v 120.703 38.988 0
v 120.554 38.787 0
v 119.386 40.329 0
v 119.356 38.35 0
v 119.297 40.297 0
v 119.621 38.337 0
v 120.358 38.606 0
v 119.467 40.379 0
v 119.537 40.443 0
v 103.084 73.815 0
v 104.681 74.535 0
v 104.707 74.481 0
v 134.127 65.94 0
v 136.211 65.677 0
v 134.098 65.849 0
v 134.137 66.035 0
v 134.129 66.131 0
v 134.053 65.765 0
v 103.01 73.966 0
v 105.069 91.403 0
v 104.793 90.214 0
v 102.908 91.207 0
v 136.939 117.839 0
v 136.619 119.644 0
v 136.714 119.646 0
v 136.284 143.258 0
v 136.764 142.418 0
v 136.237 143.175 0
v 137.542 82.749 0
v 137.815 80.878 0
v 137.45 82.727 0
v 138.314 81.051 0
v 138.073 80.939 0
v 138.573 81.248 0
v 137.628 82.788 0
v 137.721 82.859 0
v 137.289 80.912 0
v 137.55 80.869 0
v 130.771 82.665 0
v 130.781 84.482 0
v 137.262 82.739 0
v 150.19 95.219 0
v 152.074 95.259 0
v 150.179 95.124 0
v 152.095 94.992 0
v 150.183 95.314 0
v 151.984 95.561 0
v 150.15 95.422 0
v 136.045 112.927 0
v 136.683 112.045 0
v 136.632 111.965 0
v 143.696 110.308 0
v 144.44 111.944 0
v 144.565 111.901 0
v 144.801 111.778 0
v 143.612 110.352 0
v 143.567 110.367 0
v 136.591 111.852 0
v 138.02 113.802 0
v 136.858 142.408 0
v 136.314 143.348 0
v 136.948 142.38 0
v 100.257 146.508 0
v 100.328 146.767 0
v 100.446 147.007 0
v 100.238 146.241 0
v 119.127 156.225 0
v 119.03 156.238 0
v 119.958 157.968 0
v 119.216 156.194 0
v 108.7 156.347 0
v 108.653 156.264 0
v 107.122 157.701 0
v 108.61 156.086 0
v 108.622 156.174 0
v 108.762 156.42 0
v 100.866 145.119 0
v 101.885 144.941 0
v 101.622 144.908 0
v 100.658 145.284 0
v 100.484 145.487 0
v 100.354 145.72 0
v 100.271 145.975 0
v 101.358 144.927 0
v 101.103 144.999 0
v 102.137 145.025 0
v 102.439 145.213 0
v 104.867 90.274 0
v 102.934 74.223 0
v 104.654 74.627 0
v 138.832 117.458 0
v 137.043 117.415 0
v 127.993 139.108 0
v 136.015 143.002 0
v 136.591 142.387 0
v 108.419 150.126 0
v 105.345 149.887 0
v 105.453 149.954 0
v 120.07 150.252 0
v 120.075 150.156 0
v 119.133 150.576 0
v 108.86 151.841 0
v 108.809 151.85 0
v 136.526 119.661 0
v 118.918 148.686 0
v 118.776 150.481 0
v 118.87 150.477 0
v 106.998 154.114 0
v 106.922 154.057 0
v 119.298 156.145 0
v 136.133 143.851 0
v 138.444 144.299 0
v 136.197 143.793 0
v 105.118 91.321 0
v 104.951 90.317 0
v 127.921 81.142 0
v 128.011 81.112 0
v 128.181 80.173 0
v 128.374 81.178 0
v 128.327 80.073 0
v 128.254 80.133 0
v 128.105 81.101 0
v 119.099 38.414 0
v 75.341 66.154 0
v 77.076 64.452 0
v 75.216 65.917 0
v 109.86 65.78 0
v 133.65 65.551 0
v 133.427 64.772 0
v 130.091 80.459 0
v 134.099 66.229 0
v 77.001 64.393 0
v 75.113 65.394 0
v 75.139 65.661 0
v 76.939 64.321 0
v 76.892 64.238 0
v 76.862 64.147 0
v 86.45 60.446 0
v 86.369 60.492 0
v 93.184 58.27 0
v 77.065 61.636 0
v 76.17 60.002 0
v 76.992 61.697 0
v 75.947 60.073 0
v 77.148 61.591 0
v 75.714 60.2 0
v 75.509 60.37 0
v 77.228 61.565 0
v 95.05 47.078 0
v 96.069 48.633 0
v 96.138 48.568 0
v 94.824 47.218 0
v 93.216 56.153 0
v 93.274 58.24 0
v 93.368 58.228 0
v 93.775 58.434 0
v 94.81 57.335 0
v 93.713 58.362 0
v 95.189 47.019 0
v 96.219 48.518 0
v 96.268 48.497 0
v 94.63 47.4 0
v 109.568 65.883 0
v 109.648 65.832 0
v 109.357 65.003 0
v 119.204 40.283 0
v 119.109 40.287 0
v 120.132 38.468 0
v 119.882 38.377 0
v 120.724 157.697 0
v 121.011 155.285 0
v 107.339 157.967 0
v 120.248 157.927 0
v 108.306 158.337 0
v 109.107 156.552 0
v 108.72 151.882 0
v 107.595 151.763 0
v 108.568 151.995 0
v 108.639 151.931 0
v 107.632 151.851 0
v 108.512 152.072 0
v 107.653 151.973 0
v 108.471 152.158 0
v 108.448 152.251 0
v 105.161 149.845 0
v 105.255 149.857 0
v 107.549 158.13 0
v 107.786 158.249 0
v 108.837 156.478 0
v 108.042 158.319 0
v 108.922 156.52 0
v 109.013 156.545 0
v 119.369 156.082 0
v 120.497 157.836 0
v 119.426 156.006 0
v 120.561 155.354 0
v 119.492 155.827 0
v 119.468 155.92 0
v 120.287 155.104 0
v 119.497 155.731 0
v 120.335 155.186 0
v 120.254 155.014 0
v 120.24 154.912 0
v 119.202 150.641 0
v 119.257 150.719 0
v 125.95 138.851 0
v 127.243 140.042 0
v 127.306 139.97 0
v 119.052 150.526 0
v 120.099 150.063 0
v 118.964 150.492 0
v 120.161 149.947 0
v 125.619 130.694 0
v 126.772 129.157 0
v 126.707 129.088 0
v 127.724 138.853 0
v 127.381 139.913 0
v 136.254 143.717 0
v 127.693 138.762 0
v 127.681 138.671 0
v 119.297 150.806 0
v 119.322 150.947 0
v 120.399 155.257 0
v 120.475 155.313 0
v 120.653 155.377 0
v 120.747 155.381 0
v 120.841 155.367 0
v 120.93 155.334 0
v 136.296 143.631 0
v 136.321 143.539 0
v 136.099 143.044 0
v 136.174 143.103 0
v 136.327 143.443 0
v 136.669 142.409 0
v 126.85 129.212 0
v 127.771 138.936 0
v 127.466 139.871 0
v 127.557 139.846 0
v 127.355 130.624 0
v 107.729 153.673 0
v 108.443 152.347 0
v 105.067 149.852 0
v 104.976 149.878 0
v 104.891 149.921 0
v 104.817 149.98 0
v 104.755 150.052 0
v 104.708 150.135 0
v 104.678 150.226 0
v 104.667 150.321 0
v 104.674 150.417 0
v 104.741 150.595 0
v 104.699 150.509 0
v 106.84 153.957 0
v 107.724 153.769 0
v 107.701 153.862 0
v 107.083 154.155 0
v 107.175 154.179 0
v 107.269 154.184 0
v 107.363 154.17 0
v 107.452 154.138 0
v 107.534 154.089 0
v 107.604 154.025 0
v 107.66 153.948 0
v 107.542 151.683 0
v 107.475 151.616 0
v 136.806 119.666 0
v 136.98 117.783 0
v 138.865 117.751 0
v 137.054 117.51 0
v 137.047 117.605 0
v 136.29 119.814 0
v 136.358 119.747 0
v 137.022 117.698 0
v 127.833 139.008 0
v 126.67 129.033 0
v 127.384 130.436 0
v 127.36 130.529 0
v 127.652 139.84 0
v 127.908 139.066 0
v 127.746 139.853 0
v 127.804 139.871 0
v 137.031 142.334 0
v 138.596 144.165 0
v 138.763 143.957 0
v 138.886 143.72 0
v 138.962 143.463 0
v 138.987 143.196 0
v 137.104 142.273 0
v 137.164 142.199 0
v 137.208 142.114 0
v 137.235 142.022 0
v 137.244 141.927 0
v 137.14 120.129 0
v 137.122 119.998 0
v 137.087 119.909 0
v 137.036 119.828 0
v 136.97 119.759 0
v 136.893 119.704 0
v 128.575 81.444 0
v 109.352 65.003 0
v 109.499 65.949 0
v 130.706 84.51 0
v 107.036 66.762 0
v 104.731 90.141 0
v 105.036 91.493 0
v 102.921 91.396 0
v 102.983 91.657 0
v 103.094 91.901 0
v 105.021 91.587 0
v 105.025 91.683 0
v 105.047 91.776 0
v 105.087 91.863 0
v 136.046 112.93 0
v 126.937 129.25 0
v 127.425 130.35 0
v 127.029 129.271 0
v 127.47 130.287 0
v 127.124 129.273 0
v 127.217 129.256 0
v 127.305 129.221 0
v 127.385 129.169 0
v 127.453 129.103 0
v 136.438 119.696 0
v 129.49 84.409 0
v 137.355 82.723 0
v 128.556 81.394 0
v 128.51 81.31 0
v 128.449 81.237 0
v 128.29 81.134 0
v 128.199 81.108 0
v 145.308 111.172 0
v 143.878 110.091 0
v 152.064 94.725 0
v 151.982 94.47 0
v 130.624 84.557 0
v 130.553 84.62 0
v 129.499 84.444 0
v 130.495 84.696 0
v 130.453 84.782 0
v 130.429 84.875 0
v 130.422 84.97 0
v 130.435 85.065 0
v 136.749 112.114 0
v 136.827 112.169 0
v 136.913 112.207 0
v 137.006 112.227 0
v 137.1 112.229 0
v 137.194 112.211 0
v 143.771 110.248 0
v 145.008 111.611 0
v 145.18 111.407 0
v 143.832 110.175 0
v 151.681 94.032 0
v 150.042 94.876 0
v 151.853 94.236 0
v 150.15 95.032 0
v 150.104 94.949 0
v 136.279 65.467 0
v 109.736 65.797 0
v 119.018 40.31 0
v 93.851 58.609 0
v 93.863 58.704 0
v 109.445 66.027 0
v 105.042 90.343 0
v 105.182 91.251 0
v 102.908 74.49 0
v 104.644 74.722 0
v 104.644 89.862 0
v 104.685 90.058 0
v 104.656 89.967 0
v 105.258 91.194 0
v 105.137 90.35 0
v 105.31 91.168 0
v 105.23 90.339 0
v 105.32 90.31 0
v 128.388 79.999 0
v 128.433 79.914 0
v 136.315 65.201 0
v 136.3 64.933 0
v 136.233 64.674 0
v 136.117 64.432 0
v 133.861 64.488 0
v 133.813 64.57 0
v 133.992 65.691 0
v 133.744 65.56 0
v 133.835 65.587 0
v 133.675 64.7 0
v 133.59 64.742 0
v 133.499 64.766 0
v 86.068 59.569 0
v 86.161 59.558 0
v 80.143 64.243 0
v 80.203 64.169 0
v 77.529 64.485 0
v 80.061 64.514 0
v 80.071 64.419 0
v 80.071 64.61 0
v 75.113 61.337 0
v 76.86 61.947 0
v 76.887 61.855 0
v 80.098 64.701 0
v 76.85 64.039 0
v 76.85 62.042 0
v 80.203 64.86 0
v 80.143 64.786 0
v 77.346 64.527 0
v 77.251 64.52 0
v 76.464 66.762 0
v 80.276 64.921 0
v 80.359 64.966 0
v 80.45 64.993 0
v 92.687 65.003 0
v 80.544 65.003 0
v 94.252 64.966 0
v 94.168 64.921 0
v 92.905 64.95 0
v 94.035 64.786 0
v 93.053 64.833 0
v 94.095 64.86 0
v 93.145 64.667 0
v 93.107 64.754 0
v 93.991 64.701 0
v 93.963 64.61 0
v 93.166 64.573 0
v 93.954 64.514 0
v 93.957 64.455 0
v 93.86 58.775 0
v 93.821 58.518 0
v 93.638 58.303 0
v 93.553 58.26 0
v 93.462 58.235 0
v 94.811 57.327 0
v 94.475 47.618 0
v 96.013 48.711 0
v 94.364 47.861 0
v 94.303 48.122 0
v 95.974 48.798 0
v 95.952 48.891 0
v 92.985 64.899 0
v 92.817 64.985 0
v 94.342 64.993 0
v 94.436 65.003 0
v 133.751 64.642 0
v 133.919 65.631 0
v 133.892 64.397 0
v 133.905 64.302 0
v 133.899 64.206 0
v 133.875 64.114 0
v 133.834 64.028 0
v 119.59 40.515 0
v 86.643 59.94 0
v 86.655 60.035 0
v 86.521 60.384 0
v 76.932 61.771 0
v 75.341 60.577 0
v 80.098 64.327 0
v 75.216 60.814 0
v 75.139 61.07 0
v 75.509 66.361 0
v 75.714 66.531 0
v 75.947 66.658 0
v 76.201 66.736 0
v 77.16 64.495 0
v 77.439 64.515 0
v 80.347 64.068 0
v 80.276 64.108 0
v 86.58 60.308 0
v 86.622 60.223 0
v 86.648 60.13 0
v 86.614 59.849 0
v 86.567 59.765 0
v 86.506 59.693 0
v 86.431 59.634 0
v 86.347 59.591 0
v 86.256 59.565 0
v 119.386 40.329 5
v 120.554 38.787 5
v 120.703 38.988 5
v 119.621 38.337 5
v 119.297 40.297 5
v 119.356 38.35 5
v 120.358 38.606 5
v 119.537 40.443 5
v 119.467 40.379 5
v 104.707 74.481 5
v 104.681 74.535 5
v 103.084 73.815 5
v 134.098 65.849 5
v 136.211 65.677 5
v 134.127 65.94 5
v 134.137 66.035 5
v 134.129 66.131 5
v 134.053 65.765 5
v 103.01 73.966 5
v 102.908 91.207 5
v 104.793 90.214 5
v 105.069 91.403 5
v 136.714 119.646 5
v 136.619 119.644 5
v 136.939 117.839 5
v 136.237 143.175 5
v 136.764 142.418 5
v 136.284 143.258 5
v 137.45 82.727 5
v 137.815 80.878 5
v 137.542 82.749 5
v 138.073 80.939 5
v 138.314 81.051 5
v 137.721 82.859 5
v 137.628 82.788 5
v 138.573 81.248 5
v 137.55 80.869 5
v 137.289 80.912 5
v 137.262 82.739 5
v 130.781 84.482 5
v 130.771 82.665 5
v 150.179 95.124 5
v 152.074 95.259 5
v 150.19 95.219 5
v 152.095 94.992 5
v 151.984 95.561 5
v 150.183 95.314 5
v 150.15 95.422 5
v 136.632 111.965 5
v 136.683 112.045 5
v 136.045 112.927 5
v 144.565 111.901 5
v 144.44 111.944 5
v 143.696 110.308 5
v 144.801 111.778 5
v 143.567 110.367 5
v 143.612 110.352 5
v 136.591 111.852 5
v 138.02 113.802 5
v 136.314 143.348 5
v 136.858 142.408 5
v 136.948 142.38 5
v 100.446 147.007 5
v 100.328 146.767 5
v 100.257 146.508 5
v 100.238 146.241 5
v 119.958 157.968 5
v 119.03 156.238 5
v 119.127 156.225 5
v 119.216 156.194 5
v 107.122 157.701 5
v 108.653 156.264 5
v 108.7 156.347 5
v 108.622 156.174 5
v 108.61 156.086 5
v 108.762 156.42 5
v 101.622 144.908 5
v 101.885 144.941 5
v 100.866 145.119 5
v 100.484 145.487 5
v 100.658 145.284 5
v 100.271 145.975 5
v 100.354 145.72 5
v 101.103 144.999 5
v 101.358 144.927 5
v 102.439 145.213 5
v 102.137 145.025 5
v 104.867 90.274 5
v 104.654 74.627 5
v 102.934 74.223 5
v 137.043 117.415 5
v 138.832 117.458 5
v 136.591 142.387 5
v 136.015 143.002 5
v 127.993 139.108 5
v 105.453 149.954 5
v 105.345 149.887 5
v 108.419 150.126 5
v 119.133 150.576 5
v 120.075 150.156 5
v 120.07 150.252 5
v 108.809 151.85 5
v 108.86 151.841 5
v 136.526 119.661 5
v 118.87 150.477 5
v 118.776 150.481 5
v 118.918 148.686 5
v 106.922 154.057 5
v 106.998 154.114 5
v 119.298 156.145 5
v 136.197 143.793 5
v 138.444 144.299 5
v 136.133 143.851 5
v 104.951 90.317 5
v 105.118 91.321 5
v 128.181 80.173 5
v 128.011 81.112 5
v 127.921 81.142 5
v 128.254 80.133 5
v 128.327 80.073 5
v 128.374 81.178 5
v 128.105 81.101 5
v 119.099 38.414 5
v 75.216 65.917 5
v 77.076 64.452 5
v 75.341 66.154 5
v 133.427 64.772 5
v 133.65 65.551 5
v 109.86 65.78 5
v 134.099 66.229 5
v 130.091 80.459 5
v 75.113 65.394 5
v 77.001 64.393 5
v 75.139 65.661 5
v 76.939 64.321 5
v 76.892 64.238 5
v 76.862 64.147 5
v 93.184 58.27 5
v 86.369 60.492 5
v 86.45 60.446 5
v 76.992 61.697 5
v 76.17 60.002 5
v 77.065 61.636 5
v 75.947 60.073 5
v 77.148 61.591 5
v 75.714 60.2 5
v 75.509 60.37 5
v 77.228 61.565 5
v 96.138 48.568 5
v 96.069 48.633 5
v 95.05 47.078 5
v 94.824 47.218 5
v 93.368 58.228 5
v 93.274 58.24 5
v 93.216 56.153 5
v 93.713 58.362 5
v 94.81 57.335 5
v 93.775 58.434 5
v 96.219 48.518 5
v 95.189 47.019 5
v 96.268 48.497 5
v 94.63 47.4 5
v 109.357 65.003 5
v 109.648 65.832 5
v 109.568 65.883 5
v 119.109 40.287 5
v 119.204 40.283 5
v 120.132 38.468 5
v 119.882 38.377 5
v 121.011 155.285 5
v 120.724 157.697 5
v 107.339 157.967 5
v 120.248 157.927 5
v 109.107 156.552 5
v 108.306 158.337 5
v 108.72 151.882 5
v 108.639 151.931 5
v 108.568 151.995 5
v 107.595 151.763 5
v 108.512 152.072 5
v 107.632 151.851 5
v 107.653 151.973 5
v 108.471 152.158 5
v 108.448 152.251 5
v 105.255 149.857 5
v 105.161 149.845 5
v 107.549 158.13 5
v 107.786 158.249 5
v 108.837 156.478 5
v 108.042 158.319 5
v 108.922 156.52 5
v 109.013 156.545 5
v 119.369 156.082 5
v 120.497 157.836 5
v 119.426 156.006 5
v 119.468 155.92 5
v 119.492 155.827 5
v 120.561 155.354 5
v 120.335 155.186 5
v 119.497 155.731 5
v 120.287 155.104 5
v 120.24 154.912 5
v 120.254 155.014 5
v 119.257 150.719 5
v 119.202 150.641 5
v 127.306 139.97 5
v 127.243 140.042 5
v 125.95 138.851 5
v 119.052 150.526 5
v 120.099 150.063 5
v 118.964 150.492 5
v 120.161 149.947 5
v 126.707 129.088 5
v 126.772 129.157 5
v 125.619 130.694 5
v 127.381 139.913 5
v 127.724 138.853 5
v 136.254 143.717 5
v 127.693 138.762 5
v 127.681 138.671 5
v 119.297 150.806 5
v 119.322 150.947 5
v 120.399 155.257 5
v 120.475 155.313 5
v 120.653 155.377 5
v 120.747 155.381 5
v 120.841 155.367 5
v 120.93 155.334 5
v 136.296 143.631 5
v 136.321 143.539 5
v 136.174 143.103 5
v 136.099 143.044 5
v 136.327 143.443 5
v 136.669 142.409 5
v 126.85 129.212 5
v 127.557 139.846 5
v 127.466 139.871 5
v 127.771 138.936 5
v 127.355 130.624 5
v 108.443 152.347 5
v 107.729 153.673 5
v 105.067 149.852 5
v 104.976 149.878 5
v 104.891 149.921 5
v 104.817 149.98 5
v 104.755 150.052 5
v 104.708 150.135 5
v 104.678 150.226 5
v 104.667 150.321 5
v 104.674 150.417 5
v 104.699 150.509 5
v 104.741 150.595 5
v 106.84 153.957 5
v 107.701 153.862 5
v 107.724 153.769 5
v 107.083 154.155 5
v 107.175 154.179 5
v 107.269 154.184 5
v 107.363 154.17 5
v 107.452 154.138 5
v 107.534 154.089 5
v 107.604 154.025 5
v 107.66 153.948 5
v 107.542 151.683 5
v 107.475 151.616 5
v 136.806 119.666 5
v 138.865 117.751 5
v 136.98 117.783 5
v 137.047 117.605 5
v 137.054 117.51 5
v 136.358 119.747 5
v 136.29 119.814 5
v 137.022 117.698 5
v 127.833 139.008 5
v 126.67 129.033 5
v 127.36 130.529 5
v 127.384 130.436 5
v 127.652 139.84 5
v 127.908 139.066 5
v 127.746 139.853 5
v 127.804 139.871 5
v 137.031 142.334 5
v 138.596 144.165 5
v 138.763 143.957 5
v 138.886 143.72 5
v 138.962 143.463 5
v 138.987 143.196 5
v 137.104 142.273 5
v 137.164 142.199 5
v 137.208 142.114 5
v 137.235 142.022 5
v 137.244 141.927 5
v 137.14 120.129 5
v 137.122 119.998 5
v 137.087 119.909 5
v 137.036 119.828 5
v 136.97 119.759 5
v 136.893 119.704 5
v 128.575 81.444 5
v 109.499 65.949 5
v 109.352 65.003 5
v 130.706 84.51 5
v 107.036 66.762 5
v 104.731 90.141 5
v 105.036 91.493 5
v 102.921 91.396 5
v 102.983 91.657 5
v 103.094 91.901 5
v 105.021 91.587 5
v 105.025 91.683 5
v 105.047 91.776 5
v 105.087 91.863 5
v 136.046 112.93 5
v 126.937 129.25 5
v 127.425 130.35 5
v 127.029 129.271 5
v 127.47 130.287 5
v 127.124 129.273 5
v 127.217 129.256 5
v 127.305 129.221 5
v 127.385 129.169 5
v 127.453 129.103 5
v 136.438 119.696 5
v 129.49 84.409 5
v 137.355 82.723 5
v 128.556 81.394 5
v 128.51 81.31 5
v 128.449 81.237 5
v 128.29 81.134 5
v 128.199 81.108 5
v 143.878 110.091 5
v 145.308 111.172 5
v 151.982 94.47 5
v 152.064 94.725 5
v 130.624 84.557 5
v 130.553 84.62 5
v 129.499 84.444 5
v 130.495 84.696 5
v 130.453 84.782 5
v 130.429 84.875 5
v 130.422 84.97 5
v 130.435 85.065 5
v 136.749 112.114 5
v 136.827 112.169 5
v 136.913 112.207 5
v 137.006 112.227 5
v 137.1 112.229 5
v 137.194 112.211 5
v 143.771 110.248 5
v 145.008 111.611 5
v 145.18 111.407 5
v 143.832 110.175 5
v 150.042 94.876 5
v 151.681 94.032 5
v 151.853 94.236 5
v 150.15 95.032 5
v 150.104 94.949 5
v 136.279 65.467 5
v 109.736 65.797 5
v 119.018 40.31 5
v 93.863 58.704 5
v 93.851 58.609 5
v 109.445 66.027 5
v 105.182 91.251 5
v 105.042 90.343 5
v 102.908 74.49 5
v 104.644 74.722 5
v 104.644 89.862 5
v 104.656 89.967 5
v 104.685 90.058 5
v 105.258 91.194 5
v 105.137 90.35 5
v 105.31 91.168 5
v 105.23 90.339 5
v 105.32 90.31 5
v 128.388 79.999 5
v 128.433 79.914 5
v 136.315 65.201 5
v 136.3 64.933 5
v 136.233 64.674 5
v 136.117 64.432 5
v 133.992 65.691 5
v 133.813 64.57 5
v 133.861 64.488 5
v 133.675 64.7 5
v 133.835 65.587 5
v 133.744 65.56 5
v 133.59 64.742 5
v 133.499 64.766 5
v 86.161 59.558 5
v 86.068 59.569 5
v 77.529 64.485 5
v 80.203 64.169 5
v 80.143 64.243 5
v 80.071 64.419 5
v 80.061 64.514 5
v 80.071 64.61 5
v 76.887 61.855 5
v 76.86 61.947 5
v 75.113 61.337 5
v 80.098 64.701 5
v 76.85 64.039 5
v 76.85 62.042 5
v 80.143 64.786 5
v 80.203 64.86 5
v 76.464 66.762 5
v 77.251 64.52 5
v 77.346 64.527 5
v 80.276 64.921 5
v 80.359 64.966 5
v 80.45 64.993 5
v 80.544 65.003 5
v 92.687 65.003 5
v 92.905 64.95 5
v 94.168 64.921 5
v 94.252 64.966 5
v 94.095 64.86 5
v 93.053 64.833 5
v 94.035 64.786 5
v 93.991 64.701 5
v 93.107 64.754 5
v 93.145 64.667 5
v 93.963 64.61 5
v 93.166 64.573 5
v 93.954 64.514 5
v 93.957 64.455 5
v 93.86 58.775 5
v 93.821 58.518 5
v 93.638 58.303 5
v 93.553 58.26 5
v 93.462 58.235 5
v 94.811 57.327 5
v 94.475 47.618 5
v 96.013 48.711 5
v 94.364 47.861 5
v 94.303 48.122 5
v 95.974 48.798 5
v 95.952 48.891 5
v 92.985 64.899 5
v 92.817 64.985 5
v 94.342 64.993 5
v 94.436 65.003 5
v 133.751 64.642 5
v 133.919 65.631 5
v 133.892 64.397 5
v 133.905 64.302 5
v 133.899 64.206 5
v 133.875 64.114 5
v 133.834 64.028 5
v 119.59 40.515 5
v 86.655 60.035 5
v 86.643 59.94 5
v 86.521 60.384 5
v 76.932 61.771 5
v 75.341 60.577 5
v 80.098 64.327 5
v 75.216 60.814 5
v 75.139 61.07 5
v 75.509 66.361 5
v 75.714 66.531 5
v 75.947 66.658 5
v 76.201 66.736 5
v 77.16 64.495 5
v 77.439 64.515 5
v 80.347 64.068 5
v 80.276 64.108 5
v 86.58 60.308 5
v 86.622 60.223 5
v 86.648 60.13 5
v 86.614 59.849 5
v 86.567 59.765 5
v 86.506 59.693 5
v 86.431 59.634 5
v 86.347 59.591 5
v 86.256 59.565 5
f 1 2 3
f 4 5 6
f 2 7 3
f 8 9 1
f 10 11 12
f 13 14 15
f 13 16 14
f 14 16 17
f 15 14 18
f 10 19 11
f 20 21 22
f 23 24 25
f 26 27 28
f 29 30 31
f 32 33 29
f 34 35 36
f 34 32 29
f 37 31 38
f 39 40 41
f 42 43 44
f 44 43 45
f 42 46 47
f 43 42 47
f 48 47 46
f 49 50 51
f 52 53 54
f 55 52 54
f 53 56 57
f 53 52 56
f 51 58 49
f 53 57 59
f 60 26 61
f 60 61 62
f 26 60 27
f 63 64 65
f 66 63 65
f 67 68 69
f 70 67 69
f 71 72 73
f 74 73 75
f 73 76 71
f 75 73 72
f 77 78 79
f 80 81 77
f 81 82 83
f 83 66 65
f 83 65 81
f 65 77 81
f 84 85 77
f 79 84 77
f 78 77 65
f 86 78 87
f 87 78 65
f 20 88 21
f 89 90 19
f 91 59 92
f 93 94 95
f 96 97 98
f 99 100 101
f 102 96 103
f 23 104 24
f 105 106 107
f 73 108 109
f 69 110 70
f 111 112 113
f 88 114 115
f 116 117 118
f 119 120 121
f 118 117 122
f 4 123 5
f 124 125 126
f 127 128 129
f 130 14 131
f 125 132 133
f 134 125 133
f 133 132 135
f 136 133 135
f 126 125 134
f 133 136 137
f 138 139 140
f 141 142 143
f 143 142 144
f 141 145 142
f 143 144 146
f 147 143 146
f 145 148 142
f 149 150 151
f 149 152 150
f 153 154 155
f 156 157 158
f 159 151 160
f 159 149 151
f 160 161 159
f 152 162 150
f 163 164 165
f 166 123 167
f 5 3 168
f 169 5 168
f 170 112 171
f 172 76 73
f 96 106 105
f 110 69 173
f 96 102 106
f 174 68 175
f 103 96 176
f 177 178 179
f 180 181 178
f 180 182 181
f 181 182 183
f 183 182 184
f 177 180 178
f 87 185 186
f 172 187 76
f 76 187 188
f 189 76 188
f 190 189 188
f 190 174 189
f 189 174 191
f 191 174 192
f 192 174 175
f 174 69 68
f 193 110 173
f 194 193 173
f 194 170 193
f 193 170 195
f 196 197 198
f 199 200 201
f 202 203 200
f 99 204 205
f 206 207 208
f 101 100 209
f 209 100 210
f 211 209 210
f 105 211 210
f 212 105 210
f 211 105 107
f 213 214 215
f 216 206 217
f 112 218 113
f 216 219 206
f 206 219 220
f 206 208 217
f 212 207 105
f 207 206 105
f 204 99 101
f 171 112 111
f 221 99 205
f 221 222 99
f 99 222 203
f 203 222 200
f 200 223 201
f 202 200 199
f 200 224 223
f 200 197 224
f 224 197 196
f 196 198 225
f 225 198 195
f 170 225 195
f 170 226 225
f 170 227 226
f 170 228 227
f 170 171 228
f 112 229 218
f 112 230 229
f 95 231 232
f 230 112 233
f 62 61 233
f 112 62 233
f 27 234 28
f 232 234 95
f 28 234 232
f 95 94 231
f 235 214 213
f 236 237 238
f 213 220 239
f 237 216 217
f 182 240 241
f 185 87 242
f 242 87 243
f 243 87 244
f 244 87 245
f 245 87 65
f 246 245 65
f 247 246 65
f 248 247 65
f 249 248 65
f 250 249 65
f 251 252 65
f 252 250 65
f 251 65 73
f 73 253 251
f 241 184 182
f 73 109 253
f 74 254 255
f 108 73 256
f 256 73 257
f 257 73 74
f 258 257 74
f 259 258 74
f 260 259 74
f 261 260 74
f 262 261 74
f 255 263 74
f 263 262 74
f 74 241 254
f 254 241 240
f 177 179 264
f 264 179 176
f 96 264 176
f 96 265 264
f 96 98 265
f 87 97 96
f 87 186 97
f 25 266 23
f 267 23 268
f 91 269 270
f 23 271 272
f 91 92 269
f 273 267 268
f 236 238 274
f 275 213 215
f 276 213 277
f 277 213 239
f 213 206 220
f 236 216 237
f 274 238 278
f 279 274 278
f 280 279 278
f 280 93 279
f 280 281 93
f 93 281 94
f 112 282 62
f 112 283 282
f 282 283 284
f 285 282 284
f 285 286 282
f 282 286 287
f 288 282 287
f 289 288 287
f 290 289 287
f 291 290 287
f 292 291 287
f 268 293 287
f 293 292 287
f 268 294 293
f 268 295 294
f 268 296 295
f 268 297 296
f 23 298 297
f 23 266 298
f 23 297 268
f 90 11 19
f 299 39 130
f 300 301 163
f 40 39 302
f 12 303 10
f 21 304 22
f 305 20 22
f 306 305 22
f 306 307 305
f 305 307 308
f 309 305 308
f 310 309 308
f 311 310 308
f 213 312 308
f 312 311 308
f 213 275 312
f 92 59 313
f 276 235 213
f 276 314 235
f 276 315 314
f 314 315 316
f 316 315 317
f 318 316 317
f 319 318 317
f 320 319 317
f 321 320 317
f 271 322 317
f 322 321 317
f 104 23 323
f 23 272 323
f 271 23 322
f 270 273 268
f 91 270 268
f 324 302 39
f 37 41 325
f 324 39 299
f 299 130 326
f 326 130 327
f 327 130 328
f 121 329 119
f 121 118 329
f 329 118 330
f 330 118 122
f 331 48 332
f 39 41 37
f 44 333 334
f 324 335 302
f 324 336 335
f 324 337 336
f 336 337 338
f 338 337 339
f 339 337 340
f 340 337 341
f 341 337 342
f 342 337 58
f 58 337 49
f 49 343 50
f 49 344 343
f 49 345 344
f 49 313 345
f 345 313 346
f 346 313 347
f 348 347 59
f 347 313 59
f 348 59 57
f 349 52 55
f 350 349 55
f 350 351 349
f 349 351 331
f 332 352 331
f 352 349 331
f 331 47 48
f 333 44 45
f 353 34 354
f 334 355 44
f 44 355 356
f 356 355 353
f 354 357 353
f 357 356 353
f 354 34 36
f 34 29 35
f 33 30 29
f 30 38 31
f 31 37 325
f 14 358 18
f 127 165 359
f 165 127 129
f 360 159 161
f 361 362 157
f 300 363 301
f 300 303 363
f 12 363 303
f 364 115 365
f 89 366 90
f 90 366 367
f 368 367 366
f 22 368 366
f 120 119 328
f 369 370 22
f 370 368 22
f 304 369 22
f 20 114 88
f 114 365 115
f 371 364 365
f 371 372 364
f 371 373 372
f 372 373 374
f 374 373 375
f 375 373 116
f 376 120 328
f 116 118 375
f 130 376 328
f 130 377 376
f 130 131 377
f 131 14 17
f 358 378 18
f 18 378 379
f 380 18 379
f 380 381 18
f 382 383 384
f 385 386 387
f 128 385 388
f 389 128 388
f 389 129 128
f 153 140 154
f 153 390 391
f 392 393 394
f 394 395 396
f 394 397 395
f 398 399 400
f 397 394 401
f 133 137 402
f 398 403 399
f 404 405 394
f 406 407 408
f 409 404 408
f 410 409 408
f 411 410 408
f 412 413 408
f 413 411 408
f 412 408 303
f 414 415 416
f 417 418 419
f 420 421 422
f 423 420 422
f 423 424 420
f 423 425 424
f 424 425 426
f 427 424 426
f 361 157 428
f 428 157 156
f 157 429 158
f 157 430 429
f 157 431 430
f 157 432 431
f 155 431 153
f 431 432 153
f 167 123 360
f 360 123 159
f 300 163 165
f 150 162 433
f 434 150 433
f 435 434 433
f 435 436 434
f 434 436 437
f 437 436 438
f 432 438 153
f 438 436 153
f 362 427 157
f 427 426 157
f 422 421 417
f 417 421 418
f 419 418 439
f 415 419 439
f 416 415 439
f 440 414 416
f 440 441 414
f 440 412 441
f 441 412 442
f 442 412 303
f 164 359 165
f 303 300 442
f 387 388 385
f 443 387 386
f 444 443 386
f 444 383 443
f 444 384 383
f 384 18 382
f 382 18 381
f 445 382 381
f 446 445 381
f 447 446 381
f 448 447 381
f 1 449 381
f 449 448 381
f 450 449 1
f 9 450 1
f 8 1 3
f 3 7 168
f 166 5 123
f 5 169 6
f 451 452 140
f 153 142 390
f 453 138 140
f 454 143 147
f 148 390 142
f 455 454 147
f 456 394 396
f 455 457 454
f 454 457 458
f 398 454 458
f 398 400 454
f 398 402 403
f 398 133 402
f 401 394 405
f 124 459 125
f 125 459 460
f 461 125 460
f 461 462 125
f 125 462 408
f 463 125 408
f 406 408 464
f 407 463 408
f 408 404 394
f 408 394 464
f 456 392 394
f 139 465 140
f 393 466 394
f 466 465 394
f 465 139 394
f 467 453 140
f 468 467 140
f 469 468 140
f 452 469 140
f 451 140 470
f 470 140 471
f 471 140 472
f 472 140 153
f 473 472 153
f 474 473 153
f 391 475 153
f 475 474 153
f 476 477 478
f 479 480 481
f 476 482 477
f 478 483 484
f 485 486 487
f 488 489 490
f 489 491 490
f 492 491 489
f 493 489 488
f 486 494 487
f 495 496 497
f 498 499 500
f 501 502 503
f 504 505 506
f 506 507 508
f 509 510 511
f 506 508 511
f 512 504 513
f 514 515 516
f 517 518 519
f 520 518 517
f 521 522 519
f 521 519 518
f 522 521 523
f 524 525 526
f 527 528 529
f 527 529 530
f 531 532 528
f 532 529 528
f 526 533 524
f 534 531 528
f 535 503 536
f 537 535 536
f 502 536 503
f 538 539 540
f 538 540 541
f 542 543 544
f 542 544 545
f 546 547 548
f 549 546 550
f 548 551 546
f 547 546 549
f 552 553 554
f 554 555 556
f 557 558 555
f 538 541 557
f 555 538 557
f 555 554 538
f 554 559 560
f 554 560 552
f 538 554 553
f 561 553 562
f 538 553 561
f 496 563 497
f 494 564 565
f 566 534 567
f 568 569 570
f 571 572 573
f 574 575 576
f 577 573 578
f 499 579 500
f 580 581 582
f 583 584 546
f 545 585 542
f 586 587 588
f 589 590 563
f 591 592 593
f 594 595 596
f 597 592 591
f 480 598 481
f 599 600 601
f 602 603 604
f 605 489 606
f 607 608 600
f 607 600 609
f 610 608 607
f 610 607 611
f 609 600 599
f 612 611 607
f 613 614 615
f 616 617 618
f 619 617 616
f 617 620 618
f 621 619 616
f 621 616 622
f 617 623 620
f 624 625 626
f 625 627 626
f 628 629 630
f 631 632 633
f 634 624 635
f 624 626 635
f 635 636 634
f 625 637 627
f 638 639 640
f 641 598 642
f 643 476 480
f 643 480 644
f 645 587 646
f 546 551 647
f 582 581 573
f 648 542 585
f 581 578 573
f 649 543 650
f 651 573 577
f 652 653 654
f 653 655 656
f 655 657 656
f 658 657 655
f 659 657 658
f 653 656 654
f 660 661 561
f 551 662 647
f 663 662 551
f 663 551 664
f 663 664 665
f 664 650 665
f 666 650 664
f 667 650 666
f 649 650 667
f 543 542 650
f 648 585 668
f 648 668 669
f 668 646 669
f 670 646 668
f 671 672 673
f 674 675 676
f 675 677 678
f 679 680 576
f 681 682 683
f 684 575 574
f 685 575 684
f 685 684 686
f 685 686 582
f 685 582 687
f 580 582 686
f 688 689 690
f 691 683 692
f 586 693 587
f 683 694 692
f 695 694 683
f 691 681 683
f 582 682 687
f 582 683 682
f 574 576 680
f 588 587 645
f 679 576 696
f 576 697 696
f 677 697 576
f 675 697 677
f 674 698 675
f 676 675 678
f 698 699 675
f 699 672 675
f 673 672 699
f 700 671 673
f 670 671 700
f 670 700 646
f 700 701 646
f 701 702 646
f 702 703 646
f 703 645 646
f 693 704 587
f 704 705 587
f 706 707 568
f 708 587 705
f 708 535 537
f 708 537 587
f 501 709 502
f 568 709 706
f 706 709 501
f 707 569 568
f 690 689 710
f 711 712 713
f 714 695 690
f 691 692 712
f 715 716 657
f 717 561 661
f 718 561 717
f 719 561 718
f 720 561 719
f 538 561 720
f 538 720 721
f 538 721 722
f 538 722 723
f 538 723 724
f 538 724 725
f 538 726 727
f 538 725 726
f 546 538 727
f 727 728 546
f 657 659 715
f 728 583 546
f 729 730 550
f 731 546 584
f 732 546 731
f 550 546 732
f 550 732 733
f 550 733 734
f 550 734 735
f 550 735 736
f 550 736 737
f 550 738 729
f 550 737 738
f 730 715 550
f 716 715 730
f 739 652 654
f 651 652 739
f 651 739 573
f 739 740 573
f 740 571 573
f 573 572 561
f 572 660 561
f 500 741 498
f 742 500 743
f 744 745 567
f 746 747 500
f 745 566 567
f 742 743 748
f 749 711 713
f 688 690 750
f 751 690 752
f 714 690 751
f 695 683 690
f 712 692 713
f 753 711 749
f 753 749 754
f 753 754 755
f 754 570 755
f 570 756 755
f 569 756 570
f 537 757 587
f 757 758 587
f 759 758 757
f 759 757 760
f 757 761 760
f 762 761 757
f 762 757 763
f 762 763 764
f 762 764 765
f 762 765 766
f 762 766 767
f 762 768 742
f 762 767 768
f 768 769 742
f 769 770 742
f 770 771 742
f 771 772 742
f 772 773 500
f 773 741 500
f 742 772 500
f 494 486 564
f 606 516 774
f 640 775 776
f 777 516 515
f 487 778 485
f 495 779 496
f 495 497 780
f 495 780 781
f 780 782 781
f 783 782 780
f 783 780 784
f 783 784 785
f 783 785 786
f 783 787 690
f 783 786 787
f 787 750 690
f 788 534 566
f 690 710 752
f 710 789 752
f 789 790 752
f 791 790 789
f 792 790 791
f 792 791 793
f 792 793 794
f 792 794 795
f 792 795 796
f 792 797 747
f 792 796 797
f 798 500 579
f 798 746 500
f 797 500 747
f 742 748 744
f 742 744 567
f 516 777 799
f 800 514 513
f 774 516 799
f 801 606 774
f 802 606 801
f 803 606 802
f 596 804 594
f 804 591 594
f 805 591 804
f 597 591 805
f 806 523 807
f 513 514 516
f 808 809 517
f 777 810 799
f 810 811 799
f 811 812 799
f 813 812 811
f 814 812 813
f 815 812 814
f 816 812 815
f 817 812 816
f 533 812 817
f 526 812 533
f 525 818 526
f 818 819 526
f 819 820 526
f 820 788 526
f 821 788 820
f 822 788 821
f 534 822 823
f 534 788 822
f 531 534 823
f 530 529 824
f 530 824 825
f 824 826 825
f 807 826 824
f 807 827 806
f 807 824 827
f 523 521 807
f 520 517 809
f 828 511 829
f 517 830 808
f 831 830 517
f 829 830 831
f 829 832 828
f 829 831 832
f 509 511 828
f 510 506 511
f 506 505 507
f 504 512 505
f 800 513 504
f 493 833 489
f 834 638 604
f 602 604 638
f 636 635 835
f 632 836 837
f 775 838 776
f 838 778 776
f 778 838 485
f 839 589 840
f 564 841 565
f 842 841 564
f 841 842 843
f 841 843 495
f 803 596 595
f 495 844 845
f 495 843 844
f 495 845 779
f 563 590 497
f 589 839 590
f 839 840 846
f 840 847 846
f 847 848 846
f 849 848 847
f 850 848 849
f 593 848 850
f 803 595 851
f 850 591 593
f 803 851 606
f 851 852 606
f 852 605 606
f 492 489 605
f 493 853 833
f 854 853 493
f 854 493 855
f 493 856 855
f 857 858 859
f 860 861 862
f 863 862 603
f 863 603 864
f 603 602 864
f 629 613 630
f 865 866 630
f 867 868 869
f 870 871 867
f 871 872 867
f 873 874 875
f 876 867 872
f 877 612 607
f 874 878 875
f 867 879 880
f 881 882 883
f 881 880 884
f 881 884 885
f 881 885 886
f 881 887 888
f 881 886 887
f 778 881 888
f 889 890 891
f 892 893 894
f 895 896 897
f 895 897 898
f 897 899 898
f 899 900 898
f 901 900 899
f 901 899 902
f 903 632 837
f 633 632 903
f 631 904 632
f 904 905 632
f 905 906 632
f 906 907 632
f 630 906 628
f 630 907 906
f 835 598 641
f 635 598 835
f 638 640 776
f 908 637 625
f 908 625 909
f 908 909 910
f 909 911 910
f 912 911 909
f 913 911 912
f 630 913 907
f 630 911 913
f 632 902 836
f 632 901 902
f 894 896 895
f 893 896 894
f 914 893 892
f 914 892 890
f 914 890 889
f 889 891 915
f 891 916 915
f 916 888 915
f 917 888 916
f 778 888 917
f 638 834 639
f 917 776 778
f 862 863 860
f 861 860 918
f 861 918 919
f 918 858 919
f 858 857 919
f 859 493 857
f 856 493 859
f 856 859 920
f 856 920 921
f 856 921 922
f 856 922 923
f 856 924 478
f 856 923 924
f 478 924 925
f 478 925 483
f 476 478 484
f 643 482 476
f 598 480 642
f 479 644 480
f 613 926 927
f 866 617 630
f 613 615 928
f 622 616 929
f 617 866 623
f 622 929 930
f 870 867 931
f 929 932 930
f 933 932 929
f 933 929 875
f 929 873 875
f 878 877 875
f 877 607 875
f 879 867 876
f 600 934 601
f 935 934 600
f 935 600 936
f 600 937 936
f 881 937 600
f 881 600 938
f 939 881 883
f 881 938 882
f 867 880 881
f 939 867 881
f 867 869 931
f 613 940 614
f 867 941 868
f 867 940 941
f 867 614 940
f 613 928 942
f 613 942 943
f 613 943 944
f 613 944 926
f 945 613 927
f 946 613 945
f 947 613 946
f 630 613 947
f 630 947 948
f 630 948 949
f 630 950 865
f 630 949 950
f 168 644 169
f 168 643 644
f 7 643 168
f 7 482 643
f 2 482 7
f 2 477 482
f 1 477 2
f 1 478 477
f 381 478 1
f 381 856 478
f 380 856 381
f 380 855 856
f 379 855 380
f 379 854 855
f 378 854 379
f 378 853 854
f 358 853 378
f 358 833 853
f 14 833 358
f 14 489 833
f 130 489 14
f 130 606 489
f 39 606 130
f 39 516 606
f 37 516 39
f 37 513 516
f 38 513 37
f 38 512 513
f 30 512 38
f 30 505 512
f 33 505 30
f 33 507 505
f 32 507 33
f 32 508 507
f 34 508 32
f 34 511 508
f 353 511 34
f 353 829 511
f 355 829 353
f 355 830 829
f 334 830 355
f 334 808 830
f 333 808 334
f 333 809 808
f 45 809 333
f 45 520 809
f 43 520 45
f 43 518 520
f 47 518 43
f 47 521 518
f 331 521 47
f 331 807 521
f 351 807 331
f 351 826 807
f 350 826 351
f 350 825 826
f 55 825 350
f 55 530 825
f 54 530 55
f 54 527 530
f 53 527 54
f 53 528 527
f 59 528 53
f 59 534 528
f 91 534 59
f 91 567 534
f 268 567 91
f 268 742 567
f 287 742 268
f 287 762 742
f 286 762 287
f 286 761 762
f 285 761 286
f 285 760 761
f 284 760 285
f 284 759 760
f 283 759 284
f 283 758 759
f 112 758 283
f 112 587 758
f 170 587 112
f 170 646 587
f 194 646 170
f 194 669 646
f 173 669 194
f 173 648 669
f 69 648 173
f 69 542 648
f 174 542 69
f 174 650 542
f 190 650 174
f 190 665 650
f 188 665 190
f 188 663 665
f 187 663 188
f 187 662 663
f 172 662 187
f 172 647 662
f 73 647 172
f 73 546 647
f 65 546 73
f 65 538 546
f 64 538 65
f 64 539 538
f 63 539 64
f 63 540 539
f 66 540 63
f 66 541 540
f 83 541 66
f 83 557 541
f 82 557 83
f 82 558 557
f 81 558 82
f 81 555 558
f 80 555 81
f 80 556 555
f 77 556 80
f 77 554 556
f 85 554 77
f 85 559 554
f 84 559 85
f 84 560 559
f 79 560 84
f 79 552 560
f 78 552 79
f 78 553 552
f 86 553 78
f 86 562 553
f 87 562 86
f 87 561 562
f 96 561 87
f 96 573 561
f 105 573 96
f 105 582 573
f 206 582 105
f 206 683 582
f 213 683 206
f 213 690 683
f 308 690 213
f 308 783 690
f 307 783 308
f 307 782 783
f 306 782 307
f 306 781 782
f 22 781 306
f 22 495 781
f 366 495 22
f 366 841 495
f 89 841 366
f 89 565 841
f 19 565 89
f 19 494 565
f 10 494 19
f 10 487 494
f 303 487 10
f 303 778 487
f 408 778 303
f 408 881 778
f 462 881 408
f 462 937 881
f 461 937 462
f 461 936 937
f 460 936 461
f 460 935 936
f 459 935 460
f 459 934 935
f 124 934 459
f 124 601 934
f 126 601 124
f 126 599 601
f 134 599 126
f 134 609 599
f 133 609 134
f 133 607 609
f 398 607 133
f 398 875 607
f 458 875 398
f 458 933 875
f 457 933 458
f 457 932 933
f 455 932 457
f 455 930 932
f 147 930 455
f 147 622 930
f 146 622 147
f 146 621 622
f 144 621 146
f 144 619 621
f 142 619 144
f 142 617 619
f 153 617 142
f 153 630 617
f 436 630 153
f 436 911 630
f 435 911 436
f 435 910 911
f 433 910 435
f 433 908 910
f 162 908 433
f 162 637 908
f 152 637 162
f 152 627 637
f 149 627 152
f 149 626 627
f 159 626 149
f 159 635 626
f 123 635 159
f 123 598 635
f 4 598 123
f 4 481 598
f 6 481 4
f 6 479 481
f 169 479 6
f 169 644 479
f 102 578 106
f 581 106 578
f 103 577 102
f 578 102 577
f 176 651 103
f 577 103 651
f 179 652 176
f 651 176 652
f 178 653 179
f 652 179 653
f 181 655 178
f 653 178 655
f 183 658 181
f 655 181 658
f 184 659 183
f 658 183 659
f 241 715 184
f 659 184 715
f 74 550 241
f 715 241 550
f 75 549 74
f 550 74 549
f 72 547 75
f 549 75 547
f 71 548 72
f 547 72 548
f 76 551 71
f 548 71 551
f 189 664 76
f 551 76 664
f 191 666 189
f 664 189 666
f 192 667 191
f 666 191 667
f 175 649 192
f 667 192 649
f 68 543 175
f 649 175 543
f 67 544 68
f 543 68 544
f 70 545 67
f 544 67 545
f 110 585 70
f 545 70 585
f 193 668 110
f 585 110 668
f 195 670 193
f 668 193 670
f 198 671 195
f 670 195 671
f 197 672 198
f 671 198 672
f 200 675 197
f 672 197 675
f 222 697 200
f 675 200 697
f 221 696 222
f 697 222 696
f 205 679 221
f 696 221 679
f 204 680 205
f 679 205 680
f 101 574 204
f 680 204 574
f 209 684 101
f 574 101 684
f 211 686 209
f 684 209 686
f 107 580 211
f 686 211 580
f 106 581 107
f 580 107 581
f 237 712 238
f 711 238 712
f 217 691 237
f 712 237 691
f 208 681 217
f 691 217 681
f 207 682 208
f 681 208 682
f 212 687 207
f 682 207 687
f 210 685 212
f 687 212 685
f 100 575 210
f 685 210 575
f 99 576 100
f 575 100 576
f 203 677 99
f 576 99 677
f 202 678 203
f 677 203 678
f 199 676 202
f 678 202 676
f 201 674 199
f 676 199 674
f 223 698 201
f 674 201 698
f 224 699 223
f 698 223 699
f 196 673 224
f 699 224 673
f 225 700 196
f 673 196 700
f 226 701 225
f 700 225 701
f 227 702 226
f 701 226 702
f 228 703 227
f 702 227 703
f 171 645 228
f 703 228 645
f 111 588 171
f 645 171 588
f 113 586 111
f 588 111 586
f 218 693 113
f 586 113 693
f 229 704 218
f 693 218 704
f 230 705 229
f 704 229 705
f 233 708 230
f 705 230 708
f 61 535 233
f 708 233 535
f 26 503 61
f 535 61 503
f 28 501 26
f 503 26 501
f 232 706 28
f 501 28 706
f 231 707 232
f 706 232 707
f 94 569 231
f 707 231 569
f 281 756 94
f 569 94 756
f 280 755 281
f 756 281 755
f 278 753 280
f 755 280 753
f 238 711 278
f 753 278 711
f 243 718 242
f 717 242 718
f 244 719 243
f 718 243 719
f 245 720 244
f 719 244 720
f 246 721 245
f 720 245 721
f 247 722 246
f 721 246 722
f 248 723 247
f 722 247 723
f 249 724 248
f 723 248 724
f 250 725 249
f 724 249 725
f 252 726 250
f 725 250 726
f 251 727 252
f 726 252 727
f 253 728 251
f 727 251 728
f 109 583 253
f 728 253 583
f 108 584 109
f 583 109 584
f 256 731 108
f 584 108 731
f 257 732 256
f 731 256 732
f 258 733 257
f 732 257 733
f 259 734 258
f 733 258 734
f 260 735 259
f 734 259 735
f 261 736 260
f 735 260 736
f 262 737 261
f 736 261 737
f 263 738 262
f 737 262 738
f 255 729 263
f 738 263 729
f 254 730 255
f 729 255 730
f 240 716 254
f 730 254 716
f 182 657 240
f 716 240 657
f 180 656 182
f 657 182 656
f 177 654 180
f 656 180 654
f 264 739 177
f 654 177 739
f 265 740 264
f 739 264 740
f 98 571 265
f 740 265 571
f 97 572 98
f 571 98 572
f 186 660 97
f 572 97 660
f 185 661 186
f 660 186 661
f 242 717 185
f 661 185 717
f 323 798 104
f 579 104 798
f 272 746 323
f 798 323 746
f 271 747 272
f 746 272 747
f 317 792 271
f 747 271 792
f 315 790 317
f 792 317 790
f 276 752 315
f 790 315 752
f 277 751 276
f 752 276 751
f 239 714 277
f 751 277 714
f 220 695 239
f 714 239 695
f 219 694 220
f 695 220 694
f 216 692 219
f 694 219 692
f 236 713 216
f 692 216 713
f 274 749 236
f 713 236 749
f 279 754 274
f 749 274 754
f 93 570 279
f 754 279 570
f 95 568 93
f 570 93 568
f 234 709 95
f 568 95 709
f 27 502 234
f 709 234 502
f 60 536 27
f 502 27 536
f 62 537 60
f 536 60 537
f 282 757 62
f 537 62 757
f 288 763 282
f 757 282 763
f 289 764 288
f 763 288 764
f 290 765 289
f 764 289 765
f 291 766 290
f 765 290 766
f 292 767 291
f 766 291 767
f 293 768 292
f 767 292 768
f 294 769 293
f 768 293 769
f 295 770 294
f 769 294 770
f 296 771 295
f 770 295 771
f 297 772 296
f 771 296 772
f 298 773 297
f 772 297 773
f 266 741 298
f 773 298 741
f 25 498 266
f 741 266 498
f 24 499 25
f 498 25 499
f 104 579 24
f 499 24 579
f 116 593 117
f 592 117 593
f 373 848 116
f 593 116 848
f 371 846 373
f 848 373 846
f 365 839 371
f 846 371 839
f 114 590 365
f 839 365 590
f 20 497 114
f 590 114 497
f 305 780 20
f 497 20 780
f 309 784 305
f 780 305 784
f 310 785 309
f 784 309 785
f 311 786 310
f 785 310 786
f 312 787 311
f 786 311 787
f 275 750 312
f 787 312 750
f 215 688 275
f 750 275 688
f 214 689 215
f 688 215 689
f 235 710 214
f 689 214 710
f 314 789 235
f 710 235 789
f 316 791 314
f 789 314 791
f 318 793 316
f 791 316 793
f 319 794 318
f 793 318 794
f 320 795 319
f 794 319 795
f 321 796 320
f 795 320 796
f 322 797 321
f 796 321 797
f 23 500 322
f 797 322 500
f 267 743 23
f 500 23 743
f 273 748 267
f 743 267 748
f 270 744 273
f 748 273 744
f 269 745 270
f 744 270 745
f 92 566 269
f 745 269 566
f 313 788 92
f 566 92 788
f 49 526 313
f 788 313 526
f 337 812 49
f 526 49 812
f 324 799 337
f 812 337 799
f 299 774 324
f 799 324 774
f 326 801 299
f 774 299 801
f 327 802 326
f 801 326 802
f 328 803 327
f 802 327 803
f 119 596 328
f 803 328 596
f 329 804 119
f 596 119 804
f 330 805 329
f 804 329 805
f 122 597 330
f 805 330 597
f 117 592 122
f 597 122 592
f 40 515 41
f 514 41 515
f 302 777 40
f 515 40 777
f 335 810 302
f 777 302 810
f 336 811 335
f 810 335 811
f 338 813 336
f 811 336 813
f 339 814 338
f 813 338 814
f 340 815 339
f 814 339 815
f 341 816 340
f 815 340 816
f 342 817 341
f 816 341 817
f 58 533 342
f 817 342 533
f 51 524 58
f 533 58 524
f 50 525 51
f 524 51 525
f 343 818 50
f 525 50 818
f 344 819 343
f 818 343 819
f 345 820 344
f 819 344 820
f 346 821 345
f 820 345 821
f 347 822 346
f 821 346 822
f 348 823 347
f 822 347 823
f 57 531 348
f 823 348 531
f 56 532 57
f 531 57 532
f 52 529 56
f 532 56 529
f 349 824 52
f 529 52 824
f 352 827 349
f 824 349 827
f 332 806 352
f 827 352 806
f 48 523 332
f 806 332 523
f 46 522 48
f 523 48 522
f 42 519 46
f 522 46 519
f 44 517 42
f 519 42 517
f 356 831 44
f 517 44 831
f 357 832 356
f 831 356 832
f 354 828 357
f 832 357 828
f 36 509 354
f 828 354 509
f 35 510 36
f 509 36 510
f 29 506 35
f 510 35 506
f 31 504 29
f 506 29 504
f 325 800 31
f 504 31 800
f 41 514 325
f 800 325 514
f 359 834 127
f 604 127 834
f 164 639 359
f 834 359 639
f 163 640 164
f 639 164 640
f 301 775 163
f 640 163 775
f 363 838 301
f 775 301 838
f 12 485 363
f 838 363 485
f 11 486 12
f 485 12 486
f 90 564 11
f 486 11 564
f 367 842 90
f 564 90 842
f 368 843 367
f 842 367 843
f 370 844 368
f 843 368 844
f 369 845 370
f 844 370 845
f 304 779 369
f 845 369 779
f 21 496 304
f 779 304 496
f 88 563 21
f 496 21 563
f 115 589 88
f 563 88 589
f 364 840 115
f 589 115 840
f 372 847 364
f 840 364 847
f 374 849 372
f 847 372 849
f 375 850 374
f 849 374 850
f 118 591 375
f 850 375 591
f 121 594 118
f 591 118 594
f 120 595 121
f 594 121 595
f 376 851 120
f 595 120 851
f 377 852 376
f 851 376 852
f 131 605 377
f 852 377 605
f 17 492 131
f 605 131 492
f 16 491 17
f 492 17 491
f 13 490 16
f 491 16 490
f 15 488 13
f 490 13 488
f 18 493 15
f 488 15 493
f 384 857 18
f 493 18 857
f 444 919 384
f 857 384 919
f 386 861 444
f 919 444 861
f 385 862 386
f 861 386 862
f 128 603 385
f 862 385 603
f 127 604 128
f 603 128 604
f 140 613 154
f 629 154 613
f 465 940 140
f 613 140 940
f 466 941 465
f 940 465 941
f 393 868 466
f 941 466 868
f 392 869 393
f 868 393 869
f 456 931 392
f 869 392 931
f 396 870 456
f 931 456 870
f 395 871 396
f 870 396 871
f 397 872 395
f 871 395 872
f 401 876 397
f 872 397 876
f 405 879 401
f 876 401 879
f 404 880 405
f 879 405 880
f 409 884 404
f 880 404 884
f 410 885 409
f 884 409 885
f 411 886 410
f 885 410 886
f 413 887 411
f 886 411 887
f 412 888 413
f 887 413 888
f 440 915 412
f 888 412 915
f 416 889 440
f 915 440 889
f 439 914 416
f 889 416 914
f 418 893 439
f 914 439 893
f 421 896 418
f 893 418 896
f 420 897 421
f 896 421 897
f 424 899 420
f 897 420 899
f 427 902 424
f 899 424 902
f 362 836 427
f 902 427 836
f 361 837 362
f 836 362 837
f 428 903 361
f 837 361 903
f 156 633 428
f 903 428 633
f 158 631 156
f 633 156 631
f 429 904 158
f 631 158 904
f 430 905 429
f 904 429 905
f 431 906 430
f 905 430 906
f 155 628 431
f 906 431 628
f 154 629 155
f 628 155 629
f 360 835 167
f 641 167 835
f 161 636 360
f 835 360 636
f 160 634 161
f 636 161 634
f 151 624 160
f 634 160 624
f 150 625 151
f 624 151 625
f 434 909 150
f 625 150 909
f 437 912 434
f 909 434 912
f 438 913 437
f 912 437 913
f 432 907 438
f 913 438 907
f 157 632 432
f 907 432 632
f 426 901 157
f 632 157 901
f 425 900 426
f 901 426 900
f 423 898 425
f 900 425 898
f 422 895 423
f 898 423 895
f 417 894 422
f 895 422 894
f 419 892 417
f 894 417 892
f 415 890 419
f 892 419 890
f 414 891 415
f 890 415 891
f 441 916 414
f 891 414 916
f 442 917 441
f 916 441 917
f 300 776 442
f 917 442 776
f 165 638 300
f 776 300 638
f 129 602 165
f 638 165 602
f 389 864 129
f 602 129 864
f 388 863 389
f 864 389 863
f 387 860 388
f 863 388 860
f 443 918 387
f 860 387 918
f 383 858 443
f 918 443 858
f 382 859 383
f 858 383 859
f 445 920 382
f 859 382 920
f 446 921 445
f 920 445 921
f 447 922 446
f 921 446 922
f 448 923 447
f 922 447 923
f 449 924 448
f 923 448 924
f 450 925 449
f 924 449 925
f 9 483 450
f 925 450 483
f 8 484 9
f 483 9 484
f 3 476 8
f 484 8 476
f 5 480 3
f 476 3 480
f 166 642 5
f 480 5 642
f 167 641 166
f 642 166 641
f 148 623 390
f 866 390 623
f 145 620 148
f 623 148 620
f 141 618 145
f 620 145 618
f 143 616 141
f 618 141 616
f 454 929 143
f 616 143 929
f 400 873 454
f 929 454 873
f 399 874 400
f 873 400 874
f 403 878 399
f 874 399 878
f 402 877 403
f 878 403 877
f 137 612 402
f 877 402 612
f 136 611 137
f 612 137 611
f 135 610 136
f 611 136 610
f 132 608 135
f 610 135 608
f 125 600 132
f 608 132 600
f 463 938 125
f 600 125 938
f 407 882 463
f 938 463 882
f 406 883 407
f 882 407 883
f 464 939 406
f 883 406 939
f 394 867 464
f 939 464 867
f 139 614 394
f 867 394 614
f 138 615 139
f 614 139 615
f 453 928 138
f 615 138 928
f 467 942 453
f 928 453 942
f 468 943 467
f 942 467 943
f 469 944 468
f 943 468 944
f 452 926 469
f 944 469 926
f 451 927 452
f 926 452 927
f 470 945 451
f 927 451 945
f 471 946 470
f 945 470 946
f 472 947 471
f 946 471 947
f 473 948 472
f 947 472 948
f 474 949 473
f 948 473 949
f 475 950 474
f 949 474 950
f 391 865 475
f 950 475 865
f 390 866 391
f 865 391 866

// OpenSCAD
/*
 * Customizable Origami - Seahorse - https://www.thingiverse.com/thing:2704265
 * by Dennis Hofmann - https://www.thingiverse.com/mightynozzle/about
 * created 2017-12-10
 * version v1.0
 *
 * Changelog
 * --------------
 * v1.0:
 *      - final design
 * --------------
 * 
 * This work is licensed under the Creative Commons - Attribution - NonCommercial - ShareAlike license.
 * https://creativecommons.org/licenses/by-nc-sa/3.0/
 */


 // Parameter Section //
//-------------------//

// preview[view:north, tilt:top]

// The maximum size of the longest side. The shorter side will be automatically resized in same ratio.
max_size_in_millimeter = 120; //[20:300]

// The height of the model.
model_height_in_millimeter = 5; //[0.2:0.2:100]

// Thickness of the outer outline.
outline_size_in_millimeter = 1.8; //[0.5:0.1:20]

// Thickness of the inner outline.
inline_size_in_millimeter = 0.8; //[0.5:0.1:20]

// Roundiness of the ends of the inner outlines.
inline_edge_radius_in_millimeter = 0.5; //[0.0:0.1:5]

// Flip model
flip_model = "no"; //[yes,no]

/*[hidden]*/
max_size = max_size_in_millimeter;
model_height = model_height_in_millimeter;
$fn=32;

// Outer Points
A1 = [630, 499];
A2 = [778, 466];
A3 = [788, 393];
A4 = [985, 323];
A5 = [1112, 530];
A6 = [1060, 654];
A7 = [1070, 686];
A8 = [1134, 669];
A9 = [1242, 773];
A10 = [1187, 900];
A11 = [1124, 918];
A12 = [1133, 958];
A13 = [1134, 1165];
A14 = [988, 1274];
A15 = [892, 1277];
A16 = [837, 1190];
A17 = [890, 1233];
A18 = [986, 1220];
A19 = [1049, 1133];
A20 = [1046, 1060];
A21 = [859, 742];
A22 = [859, 606];
A23 = [901, 532];
A24 = [770, 532];
A25 = [630, 532];

outline = [A1, A2, A3, A4, A5, A6, A7, A8, A9, A10, A11, A12, A13, A14, A15, A16, A17, A18, A19, A20, A21, A22, A23, A24, A25];

// Polygons
C1 = [A25, A2, A24];
C2 = [A1, A25, A2];
C3 = [A3, A4, A5, A23, A24, A2];
C4 = [A5, A6, A21, A22, A23];
C5 = [A6, A7, A11, A12, A20, A21];
C6 = [A7, A8, A9, A10, A11];
C7 = [A12, A13, A19, A20];
C8 = [A19, A13, A14, A18];
C9 = [A17, A18, A14, A15];
C10 = [A16, A17, A15];

cut_polygons = [C1, C2, C3, C4, C5, C6, C7, C8, C9, C10];

min_x = A1[0];
min_y = A4[1];
max_x = A9[0];
max_y = A15[1];

x_size = max_x - min_x;
y_size = max_y - min_y;

x_factor = max_size / x_size;
y_factor = max_size / y_size;

inline_size = x_size > y_size ? inline_size_in_millimeter / x_factor / 2: inline_size_in_millimeter / y_factor / 2;
inline_edge_radius = x_size > y_size ? inline_edge_radius_in_millimeter / x_factor: inline_edge_radius_in_millimeter / y_factor;
outline_size = x_size > y_size ? outline_size_in_millimeter / x_factor - inline_size: outline_size_in_millimeter / y_factor - inline_size;


 // Program Section //
//-----------------//

if(x_size > y_size) {
    resize(newsize=[max_size, x_factor * y_size, model_height]){
        if(flip_model == "yes") {
            mirror([0,1,0]) {
                rotate([180,180,0]) {    
                    create(outline, cut_polygons);
                }
            }
        } else {
            create(outline, cut_polygons);
        }
    }
} else {
    resize(newsize=[y_factor * x_size, max_size, model_height]){
        if(flip_model == "yes") {
            mirror([0,1,0]) {
                rotate([180,180,0]) {    
                    create(outline, cut_polygons);
                }
            }
        } else {
            create(outline, cut_polygons);
        }
    }
}


 // Module Section //
//----------------//

module create() {
    linear_extrude(height=1) {
        difference() {
            offset(r = -0) {
                offset(r = +outline_size) {
                    polygon(points = outline, convexity = 10);
                }
            }
            
            for(cut_polygon = [0:len(cut_polygons)]) {
                offset(r = +inline_edge_radius) {
                    offset(r = -inline_size - inline_edge_radius) {
                        polygon(points = cut_polygons[cut_polygon], convexity = 10);
                    }
                }
            }
        }
    }
}
